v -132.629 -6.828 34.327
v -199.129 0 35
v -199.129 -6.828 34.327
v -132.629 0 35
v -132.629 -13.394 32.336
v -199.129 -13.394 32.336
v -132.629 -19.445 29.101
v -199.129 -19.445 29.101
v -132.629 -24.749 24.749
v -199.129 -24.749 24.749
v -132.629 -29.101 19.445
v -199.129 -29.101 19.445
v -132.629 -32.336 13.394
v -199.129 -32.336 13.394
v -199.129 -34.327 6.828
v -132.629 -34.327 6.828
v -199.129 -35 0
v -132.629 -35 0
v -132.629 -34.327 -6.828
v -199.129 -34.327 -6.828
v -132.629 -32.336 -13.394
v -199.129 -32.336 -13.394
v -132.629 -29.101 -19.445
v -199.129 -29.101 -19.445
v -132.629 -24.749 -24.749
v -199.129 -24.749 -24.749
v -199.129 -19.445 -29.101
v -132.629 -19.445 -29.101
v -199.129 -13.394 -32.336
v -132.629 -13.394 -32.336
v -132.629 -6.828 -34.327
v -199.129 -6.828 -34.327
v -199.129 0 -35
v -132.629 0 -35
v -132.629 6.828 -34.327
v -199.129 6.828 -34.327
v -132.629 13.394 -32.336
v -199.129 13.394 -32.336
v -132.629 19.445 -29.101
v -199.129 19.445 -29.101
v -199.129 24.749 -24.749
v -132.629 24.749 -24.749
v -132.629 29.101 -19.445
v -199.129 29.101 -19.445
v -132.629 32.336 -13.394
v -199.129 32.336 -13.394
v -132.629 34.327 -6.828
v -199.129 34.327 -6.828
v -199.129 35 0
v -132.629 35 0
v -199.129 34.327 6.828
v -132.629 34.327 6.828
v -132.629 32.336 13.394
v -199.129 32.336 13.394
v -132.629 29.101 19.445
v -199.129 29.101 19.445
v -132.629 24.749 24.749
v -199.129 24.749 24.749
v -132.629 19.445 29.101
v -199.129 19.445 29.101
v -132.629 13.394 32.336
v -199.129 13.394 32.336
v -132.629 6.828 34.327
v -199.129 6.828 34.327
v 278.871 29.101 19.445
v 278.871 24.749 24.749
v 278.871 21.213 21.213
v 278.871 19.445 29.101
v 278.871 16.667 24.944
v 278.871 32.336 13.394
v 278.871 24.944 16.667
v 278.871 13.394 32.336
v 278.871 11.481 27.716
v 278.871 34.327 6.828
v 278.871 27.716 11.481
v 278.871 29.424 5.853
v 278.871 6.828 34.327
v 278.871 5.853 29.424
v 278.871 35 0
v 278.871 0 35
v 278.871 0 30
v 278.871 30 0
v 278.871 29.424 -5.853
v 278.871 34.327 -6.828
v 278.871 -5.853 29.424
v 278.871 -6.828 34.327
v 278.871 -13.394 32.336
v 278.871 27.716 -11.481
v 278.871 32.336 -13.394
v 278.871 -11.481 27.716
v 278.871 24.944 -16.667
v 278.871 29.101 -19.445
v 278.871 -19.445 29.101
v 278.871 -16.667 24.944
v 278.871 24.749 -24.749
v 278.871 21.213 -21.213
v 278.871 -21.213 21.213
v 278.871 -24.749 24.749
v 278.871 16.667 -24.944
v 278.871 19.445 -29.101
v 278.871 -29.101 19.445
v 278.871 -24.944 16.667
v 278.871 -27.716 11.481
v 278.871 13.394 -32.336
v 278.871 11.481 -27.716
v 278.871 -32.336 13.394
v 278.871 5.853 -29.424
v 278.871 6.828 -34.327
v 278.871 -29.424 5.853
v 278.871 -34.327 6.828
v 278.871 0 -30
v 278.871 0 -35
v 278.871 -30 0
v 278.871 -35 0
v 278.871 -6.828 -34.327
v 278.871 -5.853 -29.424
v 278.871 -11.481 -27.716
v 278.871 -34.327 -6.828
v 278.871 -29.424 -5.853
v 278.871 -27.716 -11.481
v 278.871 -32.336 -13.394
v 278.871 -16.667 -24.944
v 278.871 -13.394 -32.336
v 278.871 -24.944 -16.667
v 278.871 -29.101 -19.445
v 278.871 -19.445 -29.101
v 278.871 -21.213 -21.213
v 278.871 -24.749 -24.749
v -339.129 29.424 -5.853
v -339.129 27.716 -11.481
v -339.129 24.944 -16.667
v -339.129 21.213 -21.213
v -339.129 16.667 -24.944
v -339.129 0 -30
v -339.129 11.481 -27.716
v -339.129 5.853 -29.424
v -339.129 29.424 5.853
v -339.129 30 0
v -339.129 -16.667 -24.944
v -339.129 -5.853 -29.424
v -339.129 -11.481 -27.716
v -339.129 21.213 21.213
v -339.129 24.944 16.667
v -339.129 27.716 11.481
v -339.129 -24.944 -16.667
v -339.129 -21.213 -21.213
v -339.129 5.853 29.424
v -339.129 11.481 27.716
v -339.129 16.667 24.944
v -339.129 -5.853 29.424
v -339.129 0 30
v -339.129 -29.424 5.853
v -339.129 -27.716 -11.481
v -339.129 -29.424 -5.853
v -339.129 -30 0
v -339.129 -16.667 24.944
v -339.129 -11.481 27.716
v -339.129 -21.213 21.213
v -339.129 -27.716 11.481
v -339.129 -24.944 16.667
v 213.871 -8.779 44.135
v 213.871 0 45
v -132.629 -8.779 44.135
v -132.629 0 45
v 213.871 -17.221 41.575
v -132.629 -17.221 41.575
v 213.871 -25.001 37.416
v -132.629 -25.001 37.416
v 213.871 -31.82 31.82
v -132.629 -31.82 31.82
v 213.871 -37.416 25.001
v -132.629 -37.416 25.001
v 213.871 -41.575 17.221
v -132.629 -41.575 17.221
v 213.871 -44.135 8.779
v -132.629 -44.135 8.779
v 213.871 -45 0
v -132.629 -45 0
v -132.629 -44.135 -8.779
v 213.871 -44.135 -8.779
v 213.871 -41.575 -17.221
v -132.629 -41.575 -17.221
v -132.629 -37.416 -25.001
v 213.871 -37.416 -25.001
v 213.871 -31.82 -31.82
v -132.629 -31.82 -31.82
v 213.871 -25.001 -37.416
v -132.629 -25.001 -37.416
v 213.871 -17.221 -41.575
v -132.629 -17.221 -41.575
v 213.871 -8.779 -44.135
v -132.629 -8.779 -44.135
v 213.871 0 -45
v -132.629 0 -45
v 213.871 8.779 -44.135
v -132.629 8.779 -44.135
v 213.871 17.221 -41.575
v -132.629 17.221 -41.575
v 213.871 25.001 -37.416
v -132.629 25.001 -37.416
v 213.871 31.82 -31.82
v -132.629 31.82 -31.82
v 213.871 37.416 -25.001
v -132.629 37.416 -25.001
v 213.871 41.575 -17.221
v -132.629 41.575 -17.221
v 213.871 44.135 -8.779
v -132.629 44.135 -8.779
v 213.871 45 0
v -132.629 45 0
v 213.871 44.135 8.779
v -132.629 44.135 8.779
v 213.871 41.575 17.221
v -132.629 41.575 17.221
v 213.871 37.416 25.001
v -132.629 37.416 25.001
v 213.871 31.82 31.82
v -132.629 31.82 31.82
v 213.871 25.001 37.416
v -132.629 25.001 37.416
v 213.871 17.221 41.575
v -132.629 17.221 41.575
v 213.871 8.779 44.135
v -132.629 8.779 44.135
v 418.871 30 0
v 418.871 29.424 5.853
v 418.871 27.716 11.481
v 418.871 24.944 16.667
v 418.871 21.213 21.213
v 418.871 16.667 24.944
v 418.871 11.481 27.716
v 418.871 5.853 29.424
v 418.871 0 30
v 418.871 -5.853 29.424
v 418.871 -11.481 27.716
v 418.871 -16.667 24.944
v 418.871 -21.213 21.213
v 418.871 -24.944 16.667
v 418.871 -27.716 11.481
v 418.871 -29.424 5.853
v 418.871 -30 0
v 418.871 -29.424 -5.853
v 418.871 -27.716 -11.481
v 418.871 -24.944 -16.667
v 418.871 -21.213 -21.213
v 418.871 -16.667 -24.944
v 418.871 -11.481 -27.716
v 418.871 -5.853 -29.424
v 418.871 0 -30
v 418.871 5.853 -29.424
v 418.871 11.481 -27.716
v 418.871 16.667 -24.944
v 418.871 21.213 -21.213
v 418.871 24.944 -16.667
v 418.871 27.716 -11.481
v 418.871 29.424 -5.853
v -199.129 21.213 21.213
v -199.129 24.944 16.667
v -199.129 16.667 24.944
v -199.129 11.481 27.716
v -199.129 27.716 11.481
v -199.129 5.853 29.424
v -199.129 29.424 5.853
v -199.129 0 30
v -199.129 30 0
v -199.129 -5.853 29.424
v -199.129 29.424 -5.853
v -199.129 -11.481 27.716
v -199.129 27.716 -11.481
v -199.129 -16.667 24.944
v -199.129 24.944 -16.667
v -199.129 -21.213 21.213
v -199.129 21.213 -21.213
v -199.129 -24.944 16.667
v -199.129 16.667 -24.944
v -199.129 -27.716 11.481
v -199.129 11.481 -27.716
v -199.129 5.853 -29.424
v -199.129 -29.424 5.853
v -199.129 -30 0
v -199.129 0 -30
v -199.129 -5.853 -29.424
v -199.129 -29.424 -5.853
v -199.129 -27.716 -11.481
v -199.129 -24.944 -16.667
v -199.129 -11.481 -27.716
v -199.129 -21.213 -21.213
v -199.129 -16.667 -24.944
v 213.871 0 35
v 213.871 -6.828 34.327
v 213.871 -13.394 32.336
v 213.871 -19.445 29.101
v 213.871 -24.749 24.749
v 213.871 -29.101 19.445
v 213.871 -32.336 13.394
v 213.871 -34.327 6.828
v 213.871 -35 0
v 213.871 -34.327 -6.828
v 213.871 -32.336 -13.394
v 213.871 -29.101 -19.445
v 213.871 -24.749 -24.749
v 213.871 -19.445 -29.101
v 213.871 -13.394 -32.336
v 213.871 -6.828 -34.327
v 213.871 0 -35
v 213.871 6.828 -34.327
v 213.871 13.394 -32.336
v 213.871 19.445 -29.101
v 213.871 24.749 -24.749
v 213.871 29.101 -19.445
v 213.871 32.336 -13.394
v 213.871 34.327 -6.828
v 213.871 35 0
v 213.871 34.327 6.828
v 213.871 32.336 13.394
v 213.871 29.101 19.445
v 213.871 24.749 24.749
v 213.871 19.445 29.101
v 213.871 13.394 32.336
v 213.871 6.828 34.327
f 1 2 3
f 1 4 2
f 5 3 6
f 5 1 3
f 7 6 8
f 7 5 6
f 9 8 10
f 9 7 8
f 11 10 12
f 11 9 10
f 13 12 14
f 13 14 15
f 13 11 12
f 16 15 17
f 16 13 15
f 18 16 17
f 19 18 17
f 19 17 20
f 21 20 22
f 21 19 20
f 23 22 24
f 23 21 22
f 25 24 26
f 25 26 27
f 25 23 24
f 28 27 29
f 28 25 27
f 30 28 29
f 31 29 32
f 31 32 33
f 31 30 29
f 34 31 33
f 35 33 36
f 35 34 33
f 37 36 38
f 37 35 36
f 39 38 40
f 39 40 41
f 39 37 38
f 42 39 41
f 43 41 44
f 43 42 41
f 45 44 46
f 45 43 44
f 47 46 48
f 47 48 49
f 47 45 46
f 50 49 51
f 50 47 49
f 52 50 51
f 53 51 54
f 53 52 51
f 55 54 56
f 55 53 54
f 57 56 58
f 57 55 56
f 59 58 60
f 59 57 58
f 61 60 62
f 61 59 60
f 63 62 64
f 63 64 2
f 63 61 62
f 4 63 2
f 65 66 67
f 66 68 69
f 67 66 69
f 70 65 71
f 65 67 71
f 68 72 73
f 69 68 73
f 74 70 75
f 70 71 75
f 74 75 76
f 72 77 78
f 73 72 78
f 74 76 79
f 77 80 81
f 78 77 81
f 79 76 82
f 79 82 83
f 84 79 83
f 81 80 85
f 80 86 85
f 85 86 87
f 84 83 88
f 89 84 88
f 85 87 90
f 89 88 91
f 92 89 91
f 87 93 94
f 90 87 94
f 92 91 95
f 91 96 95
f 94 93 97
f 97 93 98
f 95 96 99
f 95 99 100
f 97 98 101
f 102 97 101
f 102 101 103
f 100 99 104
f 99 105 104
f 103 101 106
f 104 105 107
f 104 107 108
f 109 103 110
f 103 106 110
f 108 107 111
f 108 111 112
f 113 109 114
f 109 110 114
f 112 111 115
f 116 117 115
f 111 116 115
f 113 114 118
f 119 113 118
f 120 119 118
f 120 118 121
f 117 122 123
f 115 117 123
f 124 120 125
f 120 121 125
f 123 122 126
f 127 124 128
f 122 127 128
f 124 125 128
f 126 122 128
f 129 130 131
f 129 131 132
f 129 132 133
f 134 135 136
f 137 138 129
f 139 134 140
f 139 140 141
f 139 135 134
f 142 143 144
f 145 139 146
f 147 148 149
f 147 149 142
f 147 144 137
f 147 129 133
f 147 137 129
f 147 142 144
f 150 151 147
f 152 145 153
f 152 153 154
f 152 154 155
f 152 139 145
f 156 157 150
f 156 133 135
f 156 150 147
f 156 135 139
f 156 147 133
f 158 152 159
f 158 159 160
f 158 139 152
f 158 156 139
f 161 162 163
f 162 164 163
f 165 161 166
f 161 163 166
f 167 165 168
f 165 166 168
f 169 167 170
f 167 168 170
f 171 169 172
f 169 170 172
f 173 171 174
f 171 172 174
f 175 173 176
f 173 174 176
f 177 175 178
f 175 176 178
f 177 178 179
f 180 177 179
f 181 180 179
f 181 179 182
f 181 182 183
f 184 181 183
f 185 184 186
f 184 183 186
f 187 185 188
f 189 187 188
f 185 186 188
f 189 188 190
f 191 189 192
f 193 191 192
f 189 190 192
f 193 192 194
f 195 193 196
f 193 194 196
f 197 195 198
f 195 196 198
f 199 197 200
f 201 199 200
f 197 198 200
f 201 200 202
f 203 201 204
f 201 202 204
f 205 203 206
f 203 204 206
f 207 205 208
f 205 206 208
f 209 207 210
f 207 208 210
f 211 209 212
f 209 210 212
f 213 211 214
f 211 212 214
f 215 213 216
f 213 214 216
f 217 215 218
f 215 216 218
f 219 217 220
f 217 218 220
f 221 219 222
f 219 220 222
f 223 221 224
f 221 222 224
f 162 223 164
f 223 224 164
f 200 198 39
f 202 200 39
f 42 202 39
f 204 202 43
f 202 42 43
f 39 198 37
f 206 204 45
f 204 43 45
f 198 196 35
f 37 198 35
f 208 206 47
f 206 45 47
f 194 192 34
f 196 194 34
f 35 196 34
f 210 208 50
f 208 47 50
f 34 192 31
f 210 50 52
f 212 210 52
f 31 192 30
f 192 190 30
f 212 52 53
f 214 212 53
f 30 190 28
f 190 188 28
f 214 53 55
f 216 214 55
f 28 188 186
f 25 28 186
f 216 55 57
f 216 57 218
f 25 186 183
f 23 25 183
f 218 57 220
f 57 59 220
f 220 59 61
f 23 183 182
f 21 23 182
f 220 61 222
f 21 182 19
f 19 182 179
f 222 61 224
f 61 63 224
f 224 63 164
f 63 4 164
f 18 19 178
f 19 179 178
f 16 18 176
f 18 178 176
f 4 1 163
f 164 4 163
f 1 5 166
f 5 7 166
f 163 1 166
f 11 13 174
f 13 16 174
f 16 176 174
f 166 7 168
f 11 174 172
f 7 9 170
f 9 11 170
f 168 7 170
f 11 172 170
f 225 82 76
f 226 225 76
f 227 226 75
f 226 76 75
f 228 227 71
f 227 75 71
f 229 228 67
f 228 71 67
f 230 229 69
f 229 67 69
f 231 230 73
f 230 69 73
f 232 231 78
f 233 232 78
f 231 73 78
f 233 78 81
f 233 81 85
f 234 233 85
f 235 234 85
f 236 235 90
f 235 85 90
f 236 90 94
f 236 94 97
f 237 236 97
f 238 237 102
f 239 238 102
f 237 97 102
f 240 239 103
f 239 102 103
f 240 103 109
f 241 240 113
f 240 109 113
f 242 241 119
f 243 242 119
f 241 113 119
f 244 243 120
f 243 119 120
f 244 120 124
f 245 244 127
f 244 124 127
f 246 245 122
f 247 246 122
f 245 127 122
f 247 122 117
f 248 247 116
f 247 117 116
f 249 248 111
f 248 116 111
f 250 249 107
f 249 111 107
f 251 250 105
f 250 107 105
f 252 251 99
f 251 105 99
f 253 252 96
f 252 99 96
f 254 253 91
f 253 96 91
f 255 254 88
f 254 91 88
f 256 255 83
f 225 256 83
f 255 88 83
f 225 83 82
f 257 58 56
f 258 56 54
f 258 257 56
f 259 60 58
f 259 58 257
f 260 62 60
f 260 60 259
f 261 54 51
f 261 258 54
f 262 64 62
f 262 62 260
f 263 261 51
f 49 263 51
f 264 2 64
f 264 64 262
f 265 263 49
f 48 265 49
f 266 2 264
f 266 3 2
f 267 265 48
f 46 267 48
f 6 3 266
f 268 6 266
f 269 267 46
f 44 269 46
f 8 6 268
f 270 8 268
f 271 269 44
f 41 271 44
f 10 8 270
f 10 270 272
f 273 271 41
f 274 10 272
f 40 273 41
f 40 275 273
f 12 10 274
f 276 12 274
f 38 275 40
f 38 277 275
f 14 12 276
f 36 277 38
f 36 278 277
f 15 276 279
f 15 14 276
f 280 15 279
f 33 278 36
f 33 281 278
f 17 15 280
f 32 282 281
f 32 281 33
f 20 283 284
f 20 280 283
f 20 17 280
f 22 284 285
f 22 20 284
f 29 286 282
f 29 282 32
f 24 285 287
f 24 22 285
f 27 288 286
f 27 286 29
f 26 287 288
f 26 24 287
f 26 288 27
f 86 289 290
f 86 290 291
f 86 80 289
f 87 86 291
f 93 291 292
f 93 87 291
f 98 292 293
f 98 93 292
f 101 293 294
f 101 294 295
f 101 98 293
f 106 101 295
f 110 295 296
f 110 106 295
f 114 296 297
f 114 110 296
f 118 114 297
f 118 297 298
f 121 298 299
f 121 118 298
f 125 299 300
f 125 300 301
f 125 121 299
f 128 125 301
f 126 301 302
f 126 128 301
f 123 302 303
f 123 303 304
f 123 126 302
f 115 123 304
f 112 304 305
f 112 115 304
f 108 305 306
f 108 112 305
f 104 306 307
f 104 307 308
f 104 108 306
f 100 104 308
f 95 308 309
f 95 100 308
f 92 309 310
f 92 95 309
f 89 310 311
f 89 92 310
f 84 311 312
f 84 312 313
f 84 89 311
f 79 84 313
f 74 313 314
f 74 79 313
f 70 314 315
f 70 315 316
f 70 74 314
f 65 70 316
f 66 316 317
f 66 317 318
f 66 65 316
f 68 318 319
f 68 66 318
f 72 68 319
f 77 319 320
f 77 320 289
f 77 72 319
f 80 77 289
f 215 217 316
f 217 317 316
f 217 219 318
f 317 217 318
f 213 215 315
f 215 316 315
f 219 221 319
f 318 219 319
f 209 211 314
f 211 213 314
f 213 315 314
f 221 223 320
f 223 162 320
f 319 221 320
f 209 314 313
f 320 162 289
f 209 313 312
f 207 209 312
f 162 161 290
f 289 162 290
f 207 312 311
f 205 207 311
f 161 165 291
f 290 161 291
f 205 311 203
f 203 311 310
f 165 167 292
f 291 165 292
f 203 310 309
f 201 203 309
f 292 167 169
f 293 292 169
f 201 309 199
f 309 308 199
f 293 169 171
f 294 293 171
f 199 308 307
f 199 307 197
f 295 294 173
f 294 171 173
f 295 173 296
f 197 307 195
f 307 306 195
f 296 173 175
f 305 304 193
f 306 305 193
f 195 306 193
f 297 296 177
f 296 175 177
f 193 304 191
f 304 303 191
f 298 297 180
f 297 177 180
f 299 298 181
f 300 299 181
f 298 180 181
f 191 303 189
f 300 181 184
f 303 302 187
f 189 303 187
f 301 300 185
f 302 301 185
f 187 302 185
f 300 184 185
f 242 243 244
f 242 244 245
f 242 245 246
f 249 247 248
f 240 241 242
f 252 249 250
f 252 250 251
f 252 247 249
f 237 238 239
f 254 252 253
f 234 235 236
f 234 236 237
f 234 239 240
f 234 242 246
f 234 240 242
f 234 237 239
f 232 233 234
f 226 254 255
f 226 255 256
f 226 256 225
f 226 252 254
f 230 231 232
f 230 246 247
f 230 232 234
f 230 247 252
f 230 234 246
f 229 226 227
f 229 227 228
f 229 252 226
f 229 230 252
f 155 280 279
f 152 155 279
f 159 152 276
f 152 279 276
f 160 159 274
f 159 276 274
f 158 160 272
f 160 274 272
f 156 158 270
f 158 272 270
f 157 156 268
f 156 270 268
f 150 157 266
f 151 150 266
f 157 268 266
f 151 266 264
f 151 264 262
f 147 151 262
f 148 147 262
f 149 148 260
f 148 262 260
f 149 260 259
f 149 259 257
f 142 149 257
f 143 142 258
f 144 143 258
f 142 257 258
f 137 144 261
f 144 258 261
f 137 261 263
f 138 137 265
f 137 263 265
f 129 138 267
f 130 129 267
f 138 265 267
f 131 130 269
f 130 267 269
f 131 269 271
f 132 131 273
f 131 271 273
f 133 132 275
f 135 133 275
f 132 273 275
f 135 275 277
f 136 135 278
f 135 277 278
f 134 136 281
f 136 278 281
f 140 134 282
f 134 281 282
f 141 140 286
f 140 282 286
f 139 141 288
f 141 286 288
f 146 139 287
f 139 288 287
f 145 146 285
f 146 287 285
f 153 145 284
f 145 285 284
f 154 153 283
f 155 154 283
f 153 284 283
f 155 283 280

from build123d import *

# Parameters (mm, degrees)
F0_W     = 66.5
F0_H     = 35
F0_W_2   = 65
F2_R     = 30
F3_DEPTH = 140
F4_R     = 30
F5_DEPTH = 140


with BuildPart() as f1:
    # F0 (on Front) → F1 (revolve)
    with BuildSketch(Plane.XZ):
        with Locations((-165.878672, 17.5)):
            Rectangle(F0_W, F0_H)
        Polygon((-132.628672, 35), (-132.628672, 0), (213.871328, 0), (213.871328, 35), (213.871328, 45), (-132.628672, 45), align=None)
        with Locations((246.371328, 17.5)):
            Rectangle(F0_W_2, F0_H)
    revolve(axis=Axis((40.621328, 0, 0), (1, 0, 0)))

    # F2 (on face) → F3 (join)
    with BuildSketch(Plane(origin=(-199.128672, 0, 0), x_dir=(0, -1, 0), z_dir=(-1, 0, 0))):
        Circle(F2_R)
    extrude(amount=F3_DEPTH)

    # F4 (on face) → F5 (join)
    with BuildSketch(Plane.YZ.offset(278.871328)):
        Circle(F4_R)
    extrude(amount=F5_DEPTH)


solid = f1.part
